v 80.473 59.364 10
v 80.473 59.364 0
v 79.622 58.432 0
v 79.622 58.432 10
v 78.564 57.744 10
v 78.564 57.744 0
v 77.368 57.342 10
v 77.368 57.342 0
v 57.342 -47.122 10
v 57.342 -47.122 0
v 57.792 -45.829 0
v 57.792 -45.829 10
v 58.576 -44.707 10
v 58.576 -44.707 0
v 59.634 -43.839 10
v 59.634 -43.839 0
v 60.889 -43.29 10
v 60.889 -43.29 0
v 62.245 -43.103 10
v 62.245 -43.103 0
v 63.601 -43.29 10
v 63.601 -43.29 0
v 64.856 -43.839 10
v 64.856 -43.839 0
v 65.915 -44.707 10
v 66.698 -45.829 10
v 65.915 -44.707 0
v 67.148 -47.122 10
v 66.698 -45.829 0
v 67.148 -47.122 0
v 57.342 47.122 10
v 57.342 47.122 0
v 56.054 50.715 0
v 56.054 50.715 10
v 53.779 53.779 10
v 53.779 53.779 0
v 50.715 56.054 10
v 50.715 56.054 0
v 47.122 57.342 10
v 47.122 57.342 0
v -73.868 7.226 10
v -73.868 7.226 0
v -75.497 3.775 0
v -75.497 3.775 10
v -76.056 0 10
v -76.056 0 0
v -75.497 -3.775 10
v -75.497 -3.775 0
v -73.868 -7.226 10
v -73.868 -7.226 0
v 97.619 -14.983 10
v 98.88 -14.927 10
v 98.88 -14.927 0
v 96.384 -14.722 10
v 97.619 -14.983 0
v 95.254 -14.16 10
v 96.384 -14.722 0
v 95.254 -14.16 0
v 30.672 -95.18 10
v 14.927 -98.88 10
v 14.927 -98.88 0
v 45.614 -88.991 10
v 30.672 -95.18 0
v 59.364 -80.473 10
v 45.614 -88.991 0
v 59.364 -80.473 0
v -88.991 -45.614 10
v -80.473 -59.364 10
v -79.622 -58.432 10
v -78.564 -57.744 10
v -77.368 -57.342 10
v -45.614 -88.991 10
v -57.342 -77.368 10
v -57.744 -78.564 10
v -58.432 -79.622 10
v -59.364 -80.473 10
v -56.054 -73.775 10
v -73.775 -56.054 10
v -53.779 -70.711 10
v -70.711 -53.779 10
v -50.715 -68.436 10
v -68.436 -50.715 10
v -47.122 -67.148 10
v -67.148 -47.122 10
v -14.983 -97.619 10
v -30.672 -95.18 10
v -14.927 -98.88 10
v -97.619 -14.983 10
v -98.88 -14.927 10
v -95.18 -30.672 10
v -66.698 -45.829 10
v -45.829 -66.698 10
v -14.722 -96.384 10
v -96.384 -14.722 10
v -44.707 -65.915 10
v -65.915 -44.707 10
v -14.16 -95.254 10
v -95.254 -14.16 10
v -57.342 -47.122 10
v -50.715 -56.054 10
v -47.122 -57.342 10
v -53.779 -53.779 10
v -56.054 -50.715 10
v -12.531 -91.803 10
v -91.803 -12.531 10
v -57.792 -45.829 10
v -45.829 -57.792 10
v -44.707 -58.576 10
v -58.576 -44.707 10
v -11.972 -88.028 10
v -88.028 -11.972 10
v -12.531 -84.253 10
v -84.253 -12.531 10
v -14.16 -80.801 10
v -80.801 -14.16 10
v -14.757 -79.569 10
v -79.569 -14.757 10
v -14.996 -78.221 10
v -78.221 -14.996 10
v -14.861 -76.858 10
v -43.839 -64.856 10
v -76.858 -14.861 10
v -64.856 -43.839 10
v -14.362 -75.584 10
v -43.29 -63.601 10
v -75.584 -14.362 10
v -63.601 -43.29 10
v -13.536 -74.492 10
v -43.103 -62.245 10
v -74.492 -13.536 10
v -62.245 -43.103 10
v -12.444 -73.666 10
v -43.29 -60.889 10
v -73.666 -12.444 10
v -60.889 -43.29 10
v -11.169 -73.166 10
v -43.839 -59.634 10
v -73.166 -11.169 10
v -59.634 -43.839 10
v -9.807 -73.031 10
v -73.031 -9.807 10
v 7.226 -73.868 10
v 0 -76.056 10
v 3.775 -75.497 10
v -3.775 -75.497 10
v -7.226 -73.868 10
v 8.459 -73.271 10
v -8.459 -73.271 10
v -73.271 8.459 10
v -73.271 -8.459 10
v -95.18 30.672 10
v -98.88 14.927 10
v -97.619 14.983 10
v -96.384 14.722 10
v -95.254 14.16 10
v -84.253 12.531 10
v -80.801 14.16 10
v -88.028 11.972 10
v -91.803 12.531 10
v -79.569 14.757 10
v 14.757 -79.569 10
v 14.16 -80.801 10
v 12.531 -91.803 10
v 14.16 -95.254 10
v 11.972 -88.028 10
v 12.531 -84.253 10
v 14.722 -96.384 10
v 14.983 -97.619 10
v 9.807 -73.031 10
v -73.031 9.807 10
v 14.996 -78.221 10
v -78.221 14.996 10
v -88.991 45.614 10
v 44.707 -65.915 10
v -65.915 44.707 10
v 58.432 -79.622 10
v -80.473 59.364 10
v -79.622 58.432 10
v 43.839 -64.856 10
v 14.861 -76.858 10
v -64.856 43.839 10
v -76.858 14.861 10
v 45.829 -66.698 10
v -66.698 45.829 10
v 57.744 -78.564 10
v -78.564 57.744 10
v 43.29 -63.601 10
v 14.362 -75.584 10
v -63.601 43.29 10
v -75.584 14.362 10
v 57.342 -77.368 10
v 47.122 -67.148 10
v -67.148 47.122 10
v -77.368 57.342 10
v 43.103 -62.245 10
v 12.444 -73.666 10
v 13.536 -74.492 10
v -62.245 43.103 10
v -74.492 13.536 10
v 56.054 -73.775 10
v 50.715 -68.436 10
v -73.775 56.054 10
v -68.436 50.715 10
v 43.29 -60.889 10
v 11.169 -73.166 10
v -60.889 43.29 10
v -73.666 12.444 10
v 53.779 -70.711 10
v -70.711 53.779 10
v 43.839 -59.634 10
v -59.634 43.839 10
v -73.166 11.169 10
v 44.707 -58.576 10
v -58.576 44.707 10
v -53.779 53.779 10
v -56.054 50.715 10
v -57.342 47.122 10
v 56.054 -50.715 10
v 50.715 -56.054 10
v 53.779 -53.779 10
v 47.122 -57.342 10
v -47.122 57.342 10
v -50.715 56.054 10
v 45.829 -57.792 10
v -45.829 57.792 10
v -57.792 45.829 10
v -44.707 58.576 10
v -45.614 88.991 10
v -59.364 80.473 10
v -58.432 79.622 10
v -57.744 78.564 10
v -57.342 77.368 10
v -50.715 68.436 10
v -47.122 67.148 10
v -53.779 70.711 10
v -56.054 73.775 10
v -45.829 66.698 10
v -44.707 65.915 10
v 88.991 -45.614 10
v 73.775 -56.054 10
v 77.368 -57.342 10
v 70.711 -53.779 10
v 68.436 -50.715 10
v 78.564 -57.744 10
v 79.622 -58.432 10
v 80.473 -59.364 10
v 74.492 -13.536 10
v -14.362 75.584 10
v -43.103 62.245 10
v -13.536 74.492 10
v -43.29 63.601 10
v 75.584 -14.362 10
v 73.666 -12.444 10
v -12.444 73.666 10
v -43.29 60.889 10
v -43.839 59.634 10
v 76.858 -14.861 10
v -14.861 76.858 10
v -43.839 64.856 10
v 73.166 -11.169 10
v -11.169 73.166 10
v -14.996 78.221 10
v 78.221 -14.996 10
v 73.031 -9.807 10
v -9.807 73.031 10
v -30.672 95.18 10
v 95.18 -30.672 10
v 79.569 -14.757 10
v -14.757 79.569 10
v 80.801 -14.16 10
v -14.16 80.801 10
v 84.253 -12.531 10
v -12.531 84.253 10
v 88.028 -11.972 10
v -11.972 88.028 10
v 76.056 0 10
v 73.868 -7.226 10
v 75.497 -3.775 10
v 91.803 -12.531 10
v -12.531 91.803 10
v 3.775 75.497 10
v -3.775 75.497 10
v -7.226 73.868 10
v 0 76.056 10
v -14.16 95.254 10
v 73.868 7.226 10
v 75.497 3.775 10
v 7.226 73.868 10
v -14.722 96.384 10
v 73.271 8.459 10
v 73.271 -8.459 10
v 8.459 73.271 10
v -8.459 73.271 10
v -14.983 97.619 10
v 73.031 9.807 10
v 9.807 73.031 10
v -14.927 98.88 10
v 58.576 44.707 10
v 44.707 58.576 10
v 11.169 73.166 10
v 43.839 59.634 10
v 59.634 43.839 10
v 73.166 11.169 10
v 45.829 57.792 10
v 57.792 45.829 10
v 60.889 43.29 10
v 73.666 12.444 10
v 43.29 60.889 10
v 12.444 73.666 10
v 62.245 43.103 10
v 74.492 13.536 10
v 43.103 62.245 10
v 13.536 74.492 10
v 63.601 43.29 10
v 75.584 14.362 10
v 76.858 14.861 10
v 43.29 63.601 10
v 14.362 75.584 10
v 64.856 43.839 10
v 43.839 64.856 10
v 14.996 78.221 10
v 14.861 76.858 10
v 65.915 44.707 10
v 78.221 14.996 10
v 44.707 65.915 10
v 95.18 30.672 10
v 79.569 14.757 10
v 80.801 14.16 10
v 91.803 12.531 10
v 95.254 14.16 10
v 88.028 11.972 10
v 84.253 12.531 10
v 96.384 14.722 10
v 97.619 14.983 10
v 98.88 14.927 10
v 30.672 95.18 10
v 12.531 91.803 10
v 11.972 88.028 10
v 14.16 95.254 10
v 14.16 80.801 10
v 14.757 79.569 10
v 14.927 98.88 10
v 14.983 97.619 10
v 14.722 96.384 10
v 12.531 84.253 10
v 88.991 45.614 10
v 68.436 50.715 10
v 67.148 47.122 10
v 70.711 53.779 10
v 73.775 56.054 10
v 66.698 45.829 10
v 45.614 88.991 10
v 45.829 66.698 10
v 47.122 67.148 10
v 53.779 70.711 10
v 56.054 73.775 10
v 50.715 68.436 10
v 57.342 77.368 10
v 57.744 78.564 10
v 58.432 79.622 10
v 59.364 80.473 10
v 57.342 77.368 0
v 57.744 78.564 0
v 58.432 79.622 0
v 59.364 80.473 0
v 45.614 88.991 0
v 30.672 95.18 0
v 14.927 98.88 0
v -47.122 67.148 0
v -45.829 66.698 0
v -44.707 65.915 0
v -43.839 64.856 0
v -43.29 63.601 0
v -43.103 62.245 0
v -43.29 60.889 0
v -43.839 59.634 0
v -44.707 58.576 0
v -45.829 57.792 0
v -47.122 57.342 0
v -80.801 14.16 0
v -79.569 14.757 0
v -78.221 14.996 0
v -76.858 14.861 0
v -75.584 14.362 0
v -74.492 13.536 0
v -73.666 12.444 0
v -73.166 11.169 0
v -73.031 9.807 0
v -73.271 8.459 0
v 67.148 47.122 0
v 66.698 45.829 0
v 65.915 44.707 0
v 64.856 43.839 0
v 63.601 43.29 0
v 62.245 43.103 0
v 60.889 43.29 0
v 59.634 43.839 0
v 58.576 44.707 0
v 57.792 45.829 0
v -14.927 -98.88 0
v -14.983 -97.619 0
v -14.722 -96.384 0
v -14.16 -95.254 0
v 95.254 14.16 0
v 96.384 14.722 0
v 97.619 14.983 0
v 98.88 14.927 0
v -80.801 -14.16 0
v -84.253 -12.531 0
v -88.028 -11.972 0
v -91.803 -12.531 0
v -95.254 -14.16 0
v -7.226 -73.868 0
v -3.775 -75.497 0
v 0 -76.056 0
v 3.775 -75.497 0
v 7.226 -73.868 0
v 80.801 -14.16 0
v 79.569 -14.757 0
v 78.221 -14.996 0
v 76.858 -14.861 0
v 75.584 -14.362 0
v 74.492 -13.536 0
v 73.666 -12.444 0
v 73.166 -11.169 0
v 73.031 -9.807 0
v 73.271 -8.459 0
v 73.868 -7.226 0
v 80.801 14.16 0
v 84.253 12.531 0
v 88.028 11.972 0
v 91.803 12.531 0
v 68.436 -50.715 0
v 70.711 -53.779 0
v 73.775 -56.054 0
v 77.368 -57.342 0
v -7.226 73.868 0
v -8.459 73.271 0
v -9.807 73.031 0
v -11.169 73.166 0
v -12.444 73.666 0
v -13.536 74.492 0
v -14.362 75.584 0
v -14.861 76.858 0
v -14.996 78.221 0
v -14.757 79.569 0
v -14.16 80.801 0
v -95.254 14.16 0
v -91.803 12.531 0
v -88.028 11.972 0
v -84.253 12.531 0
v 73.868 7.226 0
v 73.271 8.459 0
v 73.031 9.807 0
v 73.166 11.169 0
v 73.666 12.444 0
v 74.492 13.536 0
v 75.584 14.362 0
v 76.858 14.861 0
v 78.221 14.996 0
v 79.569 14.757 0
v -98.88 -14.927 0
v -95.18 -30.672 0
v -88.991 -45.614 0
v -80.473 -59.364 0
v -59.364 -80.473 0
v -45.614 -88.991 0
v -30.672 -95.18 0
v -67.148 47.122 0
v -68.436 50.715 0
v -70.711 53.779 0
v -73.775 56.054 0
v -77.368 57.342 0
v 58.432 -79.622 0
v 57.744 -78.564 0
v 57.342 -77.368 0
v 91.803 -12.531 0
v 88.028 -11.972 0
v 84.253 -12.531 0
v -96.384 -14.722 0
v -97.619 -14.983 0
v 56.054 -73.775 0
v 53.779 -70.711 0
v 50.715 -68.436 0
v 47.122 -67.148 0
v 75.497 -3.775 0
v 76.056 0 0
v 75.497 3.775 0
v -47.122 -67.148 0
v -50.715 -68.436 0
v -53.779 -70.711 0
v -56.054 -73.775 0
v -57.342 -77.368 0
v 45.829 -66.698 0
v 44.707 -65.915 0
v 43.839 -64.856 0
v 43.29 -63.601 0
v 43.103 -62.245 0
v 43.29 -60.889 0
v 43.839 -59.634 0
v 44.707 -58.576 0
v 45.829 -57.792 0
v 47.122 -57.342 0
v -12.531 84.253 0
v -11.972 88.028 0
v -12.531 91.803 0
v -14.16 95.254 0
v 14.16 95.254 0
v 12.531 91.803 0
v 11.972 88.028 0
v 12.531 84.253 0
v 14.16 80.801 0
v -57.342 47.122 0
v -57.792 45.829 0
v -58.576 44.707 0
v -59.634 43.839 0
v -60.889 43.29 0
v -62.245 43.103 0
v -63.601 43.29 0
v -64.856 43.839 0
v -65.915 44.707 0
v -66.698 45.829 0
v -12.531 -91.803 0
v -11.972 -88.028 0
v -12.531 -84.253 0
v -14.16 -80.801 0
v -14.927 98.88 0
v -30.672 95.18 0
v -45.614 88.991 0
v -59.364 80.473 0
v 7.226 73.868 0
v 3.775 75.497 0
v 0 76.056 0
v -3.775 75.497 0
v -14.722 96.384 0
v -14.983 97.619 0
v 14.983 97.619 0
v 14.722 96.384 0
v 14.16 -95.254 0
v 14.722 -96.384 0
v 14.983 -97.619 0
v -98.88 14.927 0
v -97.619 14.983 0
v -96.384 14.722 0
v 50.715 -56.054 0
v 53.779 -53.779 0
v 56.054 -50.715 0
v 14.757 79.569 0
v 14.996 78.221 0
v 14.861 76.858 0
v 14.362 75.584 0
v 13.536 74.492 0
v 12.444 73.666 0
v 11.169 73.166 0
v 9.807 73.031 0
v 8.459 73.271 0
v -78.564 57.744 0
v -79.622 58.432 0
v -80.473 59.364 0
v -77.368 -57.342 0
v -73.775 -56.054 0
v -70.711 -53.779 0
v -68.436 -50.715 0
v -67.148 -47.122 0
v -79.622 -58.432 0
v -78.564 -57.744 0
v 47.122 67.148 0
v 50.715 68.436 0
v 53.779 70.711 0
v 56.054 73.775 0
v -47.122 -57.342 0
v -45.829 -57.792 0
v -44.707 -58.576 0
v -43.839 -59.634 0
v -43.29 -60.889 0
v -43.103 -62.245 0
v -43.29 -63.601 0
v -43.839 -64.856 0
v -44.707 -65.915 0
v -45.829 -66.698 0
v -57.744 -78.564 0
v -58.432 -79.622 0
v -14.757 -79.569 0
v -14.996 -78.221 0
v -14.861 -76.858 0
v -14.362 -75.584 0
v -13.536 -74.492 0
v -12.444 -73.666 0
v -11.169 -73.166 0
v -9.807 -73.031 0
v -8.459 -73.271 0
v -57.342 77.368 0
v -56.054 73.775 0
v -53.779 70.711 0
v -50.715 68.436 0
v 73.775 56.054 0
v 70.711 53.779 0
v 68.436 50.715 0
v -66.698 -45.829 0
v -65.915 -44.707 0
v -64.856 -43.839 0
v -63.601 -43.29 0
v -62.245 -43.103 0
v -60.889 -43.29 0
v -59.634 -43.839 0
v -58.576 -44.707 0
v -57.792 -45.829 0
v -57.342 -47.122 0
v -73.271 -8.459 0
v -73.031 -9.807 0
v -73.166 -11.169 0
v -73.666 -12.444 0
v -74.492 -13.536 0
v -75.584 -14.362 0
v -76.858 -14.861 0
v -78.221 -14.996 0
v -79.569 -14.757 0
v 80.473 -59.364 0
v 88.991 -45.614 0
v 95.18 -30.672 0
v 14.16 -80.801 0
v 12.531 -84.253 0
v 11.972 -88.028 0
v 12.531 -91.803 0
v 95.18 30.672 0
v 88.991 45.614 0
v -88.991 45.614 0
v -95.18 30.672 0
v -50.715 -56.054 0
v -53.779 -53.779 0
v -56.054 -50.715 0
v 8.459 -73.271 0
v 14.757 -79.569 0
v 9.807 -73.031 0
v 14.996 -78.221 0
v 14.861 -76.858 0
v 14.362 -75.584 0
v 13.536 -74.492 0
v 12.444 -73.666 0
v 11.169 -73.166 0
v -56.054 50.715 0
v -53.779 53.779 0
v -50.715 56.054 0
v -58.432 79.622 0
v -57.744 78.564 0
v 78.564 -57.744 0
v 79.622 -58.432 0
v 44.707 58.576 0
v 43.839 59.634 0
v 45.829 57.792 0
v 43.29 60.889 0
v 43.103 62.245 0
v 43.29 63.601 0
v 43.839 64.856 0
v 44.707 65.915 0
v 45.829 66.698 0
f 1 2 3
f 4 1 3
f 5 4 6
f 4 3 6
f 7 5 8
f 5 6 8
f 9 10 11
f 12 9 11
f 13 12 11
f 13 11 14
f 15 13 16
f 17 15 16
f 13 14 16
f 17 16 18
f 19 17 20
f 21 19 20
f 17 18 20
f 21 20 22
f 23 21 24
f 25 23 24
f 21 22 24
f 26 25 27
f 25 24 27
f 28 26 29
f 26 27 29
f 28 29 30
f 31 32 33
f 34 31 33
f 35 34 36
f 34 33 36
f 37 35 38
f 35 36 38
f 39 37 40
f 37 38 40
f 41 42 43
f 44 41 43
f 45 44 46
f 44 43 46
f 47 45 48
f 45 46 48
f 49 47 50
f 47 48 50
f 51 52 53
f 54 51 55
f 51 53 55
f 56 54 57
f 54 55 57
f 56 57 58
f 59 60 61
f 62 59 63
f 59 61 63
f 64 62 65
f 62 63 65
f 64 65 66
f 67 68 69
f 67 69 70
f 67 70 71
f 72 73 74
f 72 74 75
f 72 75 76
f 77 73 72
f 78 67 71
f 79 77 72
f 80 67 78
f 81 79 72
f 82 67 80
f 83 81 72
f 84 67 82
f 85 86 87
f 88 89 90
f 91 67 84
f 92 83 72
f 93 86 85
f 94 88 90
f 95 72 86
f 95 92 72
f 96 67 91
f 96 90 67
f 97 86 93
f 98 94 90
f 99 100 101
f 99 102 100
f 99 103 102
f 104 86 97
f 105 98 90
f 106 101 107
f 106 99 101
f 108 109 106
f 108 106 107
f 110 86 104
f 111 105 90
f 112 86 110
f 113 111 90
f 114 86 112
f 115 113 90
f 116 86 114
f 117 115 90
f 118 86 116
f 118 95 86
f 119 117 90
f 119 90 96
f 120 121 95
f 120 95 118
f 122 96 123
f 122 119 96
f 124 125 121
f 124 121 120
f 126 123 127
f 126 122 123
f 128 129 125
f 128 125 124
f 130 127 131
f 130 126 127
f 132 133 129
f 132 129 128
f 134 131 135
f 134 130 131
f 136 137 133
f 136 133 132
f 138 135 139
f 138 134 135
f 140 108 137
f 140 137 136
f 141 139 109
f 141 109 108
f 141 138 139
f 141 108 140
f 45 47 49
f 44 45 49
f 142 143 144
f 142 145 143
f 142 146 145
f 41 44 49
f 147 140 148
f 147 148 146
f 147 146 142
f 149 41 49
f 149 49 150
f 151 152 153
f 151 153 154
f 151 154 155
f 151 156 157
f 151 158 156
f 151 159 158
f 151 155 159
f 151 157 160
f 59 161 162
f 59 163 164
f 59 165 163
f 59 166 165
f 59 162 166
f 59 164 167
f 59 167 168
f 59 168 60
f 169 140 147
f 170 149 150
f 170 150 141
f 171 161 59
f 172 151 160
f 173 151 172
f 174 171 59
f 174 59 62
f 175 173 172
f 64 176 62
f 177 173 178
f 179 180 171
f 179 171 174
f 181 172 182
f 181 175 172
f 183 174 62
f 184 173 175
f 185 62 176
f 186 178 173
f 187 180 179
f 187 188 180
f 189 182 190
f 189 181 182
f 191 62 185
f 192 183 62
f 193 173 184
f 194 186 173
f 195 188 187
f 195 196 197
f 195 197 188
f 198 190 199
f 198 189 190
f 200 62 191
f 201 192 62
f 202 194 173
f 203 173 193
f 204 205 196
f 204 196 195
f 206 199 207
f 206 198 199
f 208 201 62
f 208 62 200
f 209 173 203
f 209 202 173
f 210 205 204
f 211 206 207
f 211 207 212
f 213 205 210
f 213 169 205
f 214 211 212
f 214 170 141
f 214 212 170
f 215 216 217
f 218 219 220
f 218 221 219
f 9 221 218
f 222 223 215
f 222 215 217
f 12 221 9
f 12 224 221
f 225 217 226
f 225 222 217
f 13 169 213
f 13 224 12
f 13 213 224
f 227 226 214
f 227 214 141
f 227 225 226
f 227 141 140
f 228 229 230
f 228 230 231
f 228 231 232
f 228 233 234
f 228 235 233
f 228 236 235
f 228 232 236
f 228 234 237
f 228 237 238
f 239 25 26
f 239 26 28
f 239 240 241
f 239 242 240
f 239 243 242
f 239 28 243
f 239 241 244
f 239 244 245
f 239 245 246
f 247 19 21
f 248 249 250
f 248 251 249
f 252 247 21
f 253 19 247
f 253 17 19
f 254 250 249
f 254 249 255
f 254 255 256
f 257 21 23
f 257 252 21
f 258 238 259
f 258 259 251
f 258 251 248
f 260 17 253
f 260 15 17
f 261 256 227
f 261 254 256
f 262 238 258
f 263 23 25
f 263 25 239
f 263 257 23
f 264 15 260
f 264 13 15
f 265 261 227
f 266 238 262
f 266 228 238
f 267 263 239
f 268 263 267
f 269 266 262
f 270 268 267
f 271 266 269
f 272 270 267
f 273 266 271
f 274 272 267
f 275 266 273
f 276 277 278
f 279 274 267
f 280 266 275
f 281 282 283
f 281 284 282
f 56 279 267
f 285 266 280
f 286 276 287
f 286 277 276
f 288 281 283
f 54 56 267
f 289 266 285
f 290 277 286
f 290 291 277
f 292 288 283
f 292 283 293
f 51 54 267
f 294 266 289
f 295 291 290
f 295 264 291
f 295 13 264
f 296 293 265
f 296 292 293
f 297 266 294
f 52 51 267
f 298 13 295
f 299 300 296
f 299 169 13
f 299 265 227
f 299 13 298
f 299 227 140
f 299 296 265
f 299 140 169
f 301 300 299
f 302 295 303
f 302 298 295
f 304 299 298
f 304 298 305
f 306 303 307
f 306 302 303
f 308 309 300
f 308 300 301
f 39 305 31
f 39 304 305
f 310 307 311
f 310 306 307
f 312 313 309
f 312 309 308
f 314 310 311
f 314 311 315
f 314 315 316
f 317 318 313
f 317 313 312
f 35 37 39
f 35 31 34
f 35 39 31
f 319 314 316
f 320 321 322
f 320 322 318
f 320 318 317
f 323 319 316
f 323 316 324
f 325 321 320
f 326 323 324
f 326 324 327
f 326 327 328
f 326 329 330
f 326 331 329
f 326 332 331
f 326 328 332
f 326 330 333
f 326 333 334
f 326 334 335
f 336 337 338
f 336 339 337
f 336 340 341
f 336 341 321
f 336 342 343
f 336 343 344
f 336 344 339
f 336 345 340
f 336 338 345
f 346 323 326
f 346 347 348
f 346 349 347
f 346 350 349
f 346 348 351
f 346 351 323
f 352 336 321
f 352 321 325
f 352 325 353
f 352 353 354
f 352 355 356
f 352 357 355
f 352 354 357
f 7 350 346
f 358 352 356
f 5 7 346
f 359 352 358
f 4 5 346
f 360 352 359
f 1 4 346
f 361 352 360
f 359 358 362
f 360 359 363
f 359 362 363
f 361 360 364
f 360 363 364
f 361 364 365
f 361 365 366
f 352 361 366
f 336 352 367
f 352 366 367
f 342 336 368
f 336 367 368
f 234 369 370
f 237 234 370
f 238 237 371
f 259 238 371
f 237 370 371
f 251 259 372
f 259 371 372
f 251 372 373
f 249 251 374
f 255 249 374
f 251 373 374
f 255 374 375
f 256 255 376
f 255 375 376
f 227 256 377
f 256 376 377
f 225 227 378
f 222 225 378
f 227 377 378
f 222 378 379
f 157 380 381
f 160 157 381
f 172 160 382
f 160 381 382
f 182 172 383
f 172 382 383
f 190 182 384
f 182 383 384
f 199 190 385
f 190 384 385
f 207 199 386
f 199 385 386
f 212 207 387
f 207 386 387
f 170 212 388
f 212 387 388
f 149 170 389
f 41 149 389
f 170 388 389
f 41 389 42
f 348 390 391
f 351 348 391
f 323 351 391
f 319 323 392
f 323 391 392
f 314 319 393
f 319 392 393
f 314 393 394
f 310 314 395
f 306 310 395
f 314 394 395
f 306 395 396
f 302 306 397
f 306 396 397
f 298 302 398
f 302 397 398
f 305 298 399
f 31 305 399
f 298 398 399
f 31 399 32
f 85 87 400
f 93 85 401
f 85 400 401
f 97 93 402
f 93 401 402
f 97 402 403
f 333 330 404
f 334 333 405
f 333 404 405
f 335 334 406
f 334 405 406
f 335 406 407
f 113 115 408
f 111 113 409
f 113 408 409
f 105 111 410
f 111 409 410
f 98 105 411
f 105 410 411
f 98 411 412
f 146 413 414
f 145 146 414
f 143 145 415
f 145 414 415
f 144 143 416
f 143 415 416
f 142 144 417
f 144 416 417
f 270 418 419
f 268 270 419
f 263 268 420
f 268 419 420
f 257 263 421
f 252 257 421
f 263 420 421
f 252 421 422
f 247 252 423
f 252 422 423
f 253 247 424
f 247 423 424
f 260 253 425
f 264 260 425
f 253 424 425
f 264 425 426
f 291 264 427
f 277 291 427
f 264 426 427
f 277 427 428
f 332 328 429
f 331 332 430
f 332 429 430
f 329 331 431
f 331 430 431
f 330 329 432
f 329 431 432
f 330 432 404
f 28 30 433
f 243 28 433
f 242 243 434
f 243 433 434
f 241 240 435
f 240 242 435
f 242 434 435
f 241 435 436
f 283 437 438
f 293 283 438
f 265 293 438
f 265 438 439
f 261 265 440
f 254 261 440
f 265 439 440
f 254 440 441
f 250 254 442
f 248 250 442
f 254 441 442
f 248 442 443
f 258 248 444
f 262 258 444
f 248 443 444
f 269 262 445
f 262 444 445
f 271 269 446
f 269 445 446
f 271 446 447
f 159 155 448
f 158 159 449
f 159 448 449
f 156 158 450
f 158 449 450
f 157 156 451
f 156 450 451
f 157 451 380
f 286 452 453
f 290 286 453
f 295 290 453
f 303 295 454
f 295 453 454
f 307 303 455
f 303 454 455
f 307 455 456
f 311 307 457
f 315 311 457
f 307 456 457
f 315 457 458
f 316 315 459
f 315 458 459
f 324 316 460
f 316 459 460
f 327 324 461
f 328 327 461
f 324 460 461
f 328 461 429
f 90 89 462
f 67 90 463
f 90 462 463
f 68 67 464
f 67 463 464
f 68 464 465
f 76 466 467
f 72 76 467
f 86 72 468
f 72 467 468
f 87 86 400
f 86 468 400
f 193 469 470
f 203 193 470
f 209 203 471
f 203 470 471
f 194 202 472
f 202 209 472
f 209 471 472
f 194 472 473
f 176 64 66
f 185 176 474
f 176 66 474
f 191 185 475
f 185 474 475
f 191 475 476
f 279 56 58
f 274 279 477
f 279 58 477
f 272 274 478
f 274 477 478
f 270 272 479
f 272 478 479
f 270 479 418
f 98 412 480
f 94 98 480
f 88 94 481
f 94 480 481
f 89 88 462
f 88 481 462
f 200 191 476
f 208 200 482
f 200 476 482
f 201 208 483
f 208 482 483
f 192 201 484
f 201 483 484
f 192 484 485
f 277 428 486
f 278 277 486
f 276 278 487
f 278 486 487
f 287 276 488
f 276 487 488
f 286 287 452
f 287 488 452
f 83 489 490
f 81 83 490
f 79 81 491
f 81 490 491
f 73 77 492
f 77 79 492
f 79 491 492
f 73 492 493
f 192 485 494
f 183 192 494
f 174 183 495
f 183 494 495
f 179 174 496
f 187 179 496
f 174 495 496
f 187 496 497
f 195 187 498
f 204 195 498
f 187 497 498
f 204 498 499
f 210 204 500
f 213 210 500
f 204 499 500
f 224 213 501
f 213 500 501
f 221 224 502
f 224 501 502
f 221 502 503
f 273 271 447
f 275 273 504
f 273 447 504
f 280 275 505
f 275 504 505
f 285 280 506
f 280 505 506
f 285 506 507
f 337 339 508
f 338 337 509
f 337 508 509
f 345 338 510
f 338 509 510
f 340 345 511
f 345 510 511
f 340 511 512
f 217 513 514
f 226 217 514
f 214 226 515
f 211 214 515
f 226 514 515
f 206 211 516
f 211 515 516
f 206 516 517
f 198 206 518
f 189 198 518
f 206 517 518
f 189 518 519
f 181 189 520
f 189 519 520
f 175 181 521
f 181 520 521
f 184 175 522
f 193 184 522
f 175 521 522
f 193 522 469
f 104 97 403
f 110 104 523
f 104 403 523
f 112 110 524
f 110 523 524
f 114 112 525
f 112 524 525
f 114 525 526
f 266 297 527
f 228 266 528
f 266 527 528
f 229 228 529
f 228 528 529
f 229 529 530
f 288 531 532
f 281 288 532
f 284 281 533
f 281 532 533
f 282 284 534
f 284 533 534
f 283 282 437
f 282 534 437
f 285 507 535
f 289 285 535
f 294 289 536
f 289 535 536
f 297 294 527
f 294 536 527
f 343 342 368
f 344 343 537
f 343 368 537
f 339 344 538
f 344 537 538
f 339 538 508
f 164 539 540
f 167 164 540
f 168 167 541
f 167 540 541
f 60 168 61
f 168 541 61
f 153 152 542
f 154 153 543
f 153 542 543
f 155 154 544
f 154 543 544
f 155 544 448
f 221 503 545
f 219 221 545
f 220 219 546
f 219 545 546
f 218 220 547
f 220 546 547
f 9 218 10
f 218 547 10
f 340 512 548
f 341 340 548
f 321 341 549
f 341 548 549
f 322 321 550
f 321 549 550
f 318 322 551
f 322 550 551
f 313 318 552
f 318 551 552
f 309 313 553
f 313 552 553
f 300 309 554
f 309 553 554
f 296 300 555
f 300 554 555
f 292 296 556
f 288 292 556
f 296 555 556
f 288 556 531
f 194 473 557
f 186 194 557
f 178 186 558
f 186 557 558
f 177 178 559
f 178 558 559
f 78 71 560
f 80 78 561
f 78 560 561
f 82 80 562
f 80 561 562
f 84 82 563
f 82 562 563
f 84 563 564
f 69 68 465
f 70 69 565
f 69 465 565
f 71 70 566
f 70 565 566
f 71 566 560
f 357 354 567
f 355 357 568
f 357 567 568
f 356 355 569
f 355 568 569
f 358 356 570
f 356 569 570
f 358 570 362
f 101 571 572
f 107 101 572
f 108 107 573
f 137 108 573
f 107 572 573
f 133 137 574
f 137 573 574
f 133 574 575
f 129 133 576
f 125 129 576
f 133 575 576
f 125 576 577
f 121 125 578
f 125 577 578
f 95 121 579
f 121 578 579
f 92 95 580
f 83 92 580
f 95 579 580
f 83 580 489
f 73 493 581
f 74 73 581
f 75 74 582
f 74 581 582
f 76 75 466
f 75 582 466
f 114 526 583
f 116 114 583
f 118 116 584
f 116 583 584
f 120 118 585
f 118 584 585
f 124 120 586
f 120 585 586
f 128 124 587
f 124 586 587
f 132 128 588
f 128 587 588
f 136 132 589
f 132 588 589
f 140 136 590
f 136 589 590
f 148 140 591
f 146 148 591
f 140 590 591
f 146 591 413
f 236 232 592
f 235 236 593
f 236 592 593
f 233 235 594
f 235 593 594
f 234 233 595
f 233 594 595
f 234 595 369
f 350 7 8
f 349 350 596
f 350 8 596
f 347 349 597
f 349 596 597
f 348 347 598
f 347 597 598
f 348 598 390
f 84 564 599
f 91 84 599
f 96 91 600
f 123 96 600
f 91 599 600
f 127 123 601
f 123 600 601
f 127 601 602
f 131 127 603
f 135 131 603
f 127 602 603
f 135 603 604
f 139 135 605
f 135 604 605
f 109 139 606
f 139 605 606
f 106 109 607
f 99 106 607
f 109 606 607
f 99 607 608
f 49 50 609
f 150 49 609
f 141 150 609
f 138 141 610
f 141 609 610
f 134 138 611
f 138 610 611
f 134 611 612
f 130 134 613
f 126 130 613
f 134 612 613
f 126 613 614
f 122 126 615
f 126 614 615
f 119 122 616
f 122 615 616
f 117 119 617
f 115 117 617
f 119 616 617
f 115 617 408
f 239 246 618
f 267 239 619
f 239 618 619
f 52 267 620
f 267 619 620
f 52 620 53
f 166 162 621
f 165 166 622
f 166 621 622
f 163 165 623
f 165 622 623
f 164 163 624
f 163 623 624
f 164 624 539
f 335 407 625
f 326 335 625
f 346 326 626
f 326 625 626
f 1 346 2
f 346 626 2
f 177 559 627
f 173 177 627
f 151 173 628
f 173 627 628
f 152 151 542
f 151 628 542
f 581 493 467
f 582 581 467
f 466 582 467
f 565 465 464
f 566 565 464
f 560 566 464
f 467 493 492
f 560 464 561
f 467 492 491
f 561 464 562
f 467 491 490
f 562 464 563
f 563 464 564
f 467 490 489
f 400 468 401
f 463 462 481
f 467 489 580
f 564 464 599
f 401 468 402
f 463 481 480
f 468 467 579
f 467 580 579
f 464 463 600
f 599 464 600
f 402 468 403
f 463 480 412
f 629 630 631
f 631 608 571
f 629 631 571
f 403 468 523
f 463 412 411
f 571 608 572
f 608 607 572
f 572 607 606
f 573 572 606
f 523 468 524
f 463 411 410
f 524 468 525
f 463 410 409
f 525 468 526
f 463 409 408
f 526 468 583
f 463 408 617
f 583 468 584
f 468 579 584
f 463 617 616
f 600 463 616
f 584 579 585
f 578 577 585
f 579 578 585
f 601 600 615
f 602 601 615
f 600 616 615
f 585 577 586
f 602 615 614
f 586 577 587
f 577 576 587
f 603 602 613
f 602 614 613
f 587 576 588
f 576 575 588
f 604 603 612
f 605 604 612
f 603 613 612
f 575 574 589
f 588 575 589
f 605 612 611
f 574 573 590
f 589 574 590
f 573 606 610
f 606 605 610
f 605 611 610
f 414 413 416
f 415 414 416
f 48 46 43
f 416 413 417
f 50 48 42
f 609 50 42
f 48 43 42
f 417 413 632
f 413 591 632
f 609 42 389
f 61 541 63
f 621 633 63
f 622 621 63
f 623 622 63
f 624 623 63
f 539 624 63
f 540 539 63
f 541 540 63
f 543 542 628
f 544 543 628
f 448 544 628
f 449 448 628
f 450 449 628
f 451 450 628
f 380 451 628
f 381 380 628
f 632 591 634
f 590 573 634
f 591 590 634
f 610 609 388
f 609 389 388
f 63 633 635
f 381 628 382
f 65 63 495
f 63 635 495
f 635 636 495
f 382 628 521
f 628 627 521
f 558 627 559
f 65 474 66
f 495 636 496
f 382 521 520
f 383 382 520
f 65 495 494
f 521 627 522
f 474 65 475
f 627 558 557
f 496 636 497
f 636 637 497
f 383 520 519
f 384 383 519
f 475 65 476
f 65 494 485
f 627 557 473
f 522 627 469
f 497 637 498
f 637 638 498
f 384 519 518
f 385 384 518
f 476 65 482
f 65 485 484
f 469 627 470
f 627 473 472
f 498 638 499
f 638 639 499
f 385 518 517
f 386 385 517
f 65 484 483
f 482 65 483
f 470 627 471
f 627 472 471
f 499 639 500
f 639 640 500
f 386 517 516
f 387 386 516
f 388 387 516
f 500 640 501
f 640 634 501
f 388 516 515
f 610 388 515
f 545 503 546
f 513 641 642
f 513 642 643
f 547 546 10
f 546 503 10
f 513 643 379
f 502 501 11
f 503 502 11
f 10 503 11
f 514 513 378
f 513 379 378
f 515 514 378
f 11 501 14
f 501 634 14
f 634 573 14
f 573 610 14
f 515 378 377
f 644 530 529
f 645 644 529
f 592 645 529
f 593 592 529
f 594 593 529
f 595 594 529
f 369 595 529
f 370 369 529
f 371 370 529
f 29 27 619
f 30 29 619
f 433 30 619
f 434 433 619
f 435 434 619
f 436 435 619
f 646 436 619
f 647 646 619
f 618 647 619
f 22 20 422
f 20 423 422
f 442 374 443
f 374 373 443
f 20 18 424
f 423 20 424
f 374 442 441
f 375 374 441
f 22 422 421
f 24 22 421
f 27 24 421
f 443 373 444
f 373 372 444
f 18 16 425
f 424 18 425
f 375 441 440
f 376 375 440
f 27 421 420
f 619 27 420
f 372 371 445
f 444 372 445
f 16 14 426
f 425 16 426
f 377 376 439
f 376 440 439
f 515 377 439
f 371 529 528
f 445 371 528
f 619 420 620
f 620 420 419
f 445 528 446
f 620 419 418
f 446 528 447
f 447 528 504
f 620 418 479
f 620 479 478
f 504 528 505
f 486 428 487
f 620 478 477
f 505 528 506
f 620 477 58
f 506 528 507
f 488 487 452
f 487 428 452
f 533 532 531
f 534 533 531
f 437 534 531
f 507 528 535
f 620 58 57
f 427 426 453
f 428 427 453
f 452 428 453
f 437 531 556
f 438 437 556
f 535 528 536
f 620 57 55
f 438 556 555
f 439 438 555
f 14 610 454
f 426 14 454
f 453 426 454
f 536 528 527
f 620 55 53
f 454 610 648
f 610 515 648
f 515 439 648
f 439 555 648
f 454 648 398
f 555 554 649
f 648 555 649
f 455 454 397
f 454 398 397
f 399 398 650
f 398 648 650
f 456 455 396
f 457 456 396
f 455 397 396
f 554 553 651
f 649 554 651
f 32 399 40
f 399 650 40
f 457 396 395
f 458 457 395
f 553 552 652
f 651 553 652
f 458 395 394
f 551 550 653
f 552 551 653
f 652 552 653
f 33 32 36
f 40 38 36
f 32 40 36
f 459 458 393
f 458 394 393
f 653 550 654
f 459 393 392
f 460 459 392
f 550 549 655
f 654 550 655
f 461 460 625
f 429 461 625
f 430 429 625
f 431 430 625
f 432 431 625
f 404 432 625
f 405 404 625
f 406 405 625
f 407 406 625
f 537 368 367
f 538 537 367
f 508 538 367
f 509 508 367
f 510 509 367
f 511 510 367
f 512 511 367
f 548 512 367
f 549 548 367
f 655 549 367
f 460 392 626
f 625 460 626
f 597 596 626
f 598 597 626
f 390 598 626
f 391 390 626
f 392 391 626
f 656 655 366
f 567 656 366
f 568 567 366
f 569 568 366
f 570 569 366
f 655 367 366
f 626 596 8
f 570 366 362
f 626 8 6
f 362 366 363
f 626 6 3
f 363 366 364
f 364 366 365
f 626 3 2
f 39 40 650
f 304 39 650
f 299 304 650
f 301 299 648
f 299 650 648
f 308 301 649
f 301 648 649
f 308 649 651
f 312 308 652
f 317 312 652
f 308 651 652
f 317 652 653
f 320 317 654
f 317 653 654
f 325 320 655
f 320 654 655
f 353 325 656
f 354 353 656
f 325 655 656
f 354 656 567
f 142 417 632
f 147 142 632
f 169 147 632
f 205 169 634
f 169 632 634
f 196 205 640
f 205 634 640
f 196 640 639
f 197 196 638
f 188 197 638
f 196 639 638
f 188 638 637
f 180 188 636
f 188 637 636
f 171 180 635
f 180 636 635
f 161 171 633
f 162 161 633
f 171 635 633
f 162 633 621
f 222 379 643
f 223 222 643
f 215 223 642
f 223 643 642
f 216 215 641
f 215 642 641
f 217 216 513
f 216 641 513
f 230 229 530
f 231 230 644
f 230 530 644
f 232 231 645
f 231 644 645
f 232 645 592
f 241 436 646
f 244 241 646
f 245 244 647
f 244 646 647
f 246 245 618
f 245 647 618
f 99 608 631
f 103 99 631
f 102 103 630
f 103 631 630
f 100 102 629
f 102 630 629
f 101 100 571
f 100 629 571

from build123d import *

# Parameters (mm, degrees)
SKETCH_1_R               = 100
EXTRUDE_1_DEPTH          = 10
CUT_EXTRUDE_5_DEPTH      = 142.774468788
PATTERN_CIRCULAR_1_COUNT = 8


with BuildPart() as part:
    # 草圖1 → 伸長1 (new body)
    with BuildSketch(Plane.XY):
        Circle(SKETCH_1_R)
    extrude(amount=EXTRUDE_1_DEPTH)

    # 草圖2 → 伸長5 (cut, through all)
    with BuildSketch(Plane.XY):
        with BuildLine():
            ThreePointArc((14.160251472, 95.254255396), (11.972243623, 88.027756377), (14.160251472, 80.801257358))
            ThreePointArc((14.160251472, 80.801257358), (13.535533906, 74.492222471), (7.226499019, 73.867504906))
            ThreePointArc((7.226499019, 73.867504906), (0, 76.055512755), (-7.226499019, 73.867504906))
            ThreePointArc((-7.226499019, 73.867504906), (-13.535533906, 74.492222471), (-14.160251472, 80.801257358))
            ThreePointArc((-14.160251472, 80.801257358), (-11.972243623, 88.027756377), (-14.160251472, 95.254255396))
            ThreePointArc((-14.160251472, 95.254255396), (-13.535533906, 101.563290283), (-7.226499019, 102.188007849))
            ThreePointArc((-7.226499019, 102.188007849), (0, 100), (7.226499019, 102.188007849))
            ThreePointArc((7.226499019, 102.188007849), (13.535533906, 101.563290283), (14.160251472, 95.254255396))
        make_face()
    cut_extrude_5 = extrude(amount=CUT_EXTRUDE_5_DEPTH, mode=Mode.SUBTRACT)

    # 環狀複製排列1: 伸長5 ×8 about axis
    pattern_circular_1_axis = Axis((0, 0, 0), (0, 0, 1))
    for i in range(1, PATTERN_CIRCULAR_1_COUNT):
        add(cut_extrude_5.rotate(pattern_circular_1_axis, i * 360 / PATTERN_CIRCULAR_1_COUNT), mode=Mode.SUBTRACT)


solid = part.part
